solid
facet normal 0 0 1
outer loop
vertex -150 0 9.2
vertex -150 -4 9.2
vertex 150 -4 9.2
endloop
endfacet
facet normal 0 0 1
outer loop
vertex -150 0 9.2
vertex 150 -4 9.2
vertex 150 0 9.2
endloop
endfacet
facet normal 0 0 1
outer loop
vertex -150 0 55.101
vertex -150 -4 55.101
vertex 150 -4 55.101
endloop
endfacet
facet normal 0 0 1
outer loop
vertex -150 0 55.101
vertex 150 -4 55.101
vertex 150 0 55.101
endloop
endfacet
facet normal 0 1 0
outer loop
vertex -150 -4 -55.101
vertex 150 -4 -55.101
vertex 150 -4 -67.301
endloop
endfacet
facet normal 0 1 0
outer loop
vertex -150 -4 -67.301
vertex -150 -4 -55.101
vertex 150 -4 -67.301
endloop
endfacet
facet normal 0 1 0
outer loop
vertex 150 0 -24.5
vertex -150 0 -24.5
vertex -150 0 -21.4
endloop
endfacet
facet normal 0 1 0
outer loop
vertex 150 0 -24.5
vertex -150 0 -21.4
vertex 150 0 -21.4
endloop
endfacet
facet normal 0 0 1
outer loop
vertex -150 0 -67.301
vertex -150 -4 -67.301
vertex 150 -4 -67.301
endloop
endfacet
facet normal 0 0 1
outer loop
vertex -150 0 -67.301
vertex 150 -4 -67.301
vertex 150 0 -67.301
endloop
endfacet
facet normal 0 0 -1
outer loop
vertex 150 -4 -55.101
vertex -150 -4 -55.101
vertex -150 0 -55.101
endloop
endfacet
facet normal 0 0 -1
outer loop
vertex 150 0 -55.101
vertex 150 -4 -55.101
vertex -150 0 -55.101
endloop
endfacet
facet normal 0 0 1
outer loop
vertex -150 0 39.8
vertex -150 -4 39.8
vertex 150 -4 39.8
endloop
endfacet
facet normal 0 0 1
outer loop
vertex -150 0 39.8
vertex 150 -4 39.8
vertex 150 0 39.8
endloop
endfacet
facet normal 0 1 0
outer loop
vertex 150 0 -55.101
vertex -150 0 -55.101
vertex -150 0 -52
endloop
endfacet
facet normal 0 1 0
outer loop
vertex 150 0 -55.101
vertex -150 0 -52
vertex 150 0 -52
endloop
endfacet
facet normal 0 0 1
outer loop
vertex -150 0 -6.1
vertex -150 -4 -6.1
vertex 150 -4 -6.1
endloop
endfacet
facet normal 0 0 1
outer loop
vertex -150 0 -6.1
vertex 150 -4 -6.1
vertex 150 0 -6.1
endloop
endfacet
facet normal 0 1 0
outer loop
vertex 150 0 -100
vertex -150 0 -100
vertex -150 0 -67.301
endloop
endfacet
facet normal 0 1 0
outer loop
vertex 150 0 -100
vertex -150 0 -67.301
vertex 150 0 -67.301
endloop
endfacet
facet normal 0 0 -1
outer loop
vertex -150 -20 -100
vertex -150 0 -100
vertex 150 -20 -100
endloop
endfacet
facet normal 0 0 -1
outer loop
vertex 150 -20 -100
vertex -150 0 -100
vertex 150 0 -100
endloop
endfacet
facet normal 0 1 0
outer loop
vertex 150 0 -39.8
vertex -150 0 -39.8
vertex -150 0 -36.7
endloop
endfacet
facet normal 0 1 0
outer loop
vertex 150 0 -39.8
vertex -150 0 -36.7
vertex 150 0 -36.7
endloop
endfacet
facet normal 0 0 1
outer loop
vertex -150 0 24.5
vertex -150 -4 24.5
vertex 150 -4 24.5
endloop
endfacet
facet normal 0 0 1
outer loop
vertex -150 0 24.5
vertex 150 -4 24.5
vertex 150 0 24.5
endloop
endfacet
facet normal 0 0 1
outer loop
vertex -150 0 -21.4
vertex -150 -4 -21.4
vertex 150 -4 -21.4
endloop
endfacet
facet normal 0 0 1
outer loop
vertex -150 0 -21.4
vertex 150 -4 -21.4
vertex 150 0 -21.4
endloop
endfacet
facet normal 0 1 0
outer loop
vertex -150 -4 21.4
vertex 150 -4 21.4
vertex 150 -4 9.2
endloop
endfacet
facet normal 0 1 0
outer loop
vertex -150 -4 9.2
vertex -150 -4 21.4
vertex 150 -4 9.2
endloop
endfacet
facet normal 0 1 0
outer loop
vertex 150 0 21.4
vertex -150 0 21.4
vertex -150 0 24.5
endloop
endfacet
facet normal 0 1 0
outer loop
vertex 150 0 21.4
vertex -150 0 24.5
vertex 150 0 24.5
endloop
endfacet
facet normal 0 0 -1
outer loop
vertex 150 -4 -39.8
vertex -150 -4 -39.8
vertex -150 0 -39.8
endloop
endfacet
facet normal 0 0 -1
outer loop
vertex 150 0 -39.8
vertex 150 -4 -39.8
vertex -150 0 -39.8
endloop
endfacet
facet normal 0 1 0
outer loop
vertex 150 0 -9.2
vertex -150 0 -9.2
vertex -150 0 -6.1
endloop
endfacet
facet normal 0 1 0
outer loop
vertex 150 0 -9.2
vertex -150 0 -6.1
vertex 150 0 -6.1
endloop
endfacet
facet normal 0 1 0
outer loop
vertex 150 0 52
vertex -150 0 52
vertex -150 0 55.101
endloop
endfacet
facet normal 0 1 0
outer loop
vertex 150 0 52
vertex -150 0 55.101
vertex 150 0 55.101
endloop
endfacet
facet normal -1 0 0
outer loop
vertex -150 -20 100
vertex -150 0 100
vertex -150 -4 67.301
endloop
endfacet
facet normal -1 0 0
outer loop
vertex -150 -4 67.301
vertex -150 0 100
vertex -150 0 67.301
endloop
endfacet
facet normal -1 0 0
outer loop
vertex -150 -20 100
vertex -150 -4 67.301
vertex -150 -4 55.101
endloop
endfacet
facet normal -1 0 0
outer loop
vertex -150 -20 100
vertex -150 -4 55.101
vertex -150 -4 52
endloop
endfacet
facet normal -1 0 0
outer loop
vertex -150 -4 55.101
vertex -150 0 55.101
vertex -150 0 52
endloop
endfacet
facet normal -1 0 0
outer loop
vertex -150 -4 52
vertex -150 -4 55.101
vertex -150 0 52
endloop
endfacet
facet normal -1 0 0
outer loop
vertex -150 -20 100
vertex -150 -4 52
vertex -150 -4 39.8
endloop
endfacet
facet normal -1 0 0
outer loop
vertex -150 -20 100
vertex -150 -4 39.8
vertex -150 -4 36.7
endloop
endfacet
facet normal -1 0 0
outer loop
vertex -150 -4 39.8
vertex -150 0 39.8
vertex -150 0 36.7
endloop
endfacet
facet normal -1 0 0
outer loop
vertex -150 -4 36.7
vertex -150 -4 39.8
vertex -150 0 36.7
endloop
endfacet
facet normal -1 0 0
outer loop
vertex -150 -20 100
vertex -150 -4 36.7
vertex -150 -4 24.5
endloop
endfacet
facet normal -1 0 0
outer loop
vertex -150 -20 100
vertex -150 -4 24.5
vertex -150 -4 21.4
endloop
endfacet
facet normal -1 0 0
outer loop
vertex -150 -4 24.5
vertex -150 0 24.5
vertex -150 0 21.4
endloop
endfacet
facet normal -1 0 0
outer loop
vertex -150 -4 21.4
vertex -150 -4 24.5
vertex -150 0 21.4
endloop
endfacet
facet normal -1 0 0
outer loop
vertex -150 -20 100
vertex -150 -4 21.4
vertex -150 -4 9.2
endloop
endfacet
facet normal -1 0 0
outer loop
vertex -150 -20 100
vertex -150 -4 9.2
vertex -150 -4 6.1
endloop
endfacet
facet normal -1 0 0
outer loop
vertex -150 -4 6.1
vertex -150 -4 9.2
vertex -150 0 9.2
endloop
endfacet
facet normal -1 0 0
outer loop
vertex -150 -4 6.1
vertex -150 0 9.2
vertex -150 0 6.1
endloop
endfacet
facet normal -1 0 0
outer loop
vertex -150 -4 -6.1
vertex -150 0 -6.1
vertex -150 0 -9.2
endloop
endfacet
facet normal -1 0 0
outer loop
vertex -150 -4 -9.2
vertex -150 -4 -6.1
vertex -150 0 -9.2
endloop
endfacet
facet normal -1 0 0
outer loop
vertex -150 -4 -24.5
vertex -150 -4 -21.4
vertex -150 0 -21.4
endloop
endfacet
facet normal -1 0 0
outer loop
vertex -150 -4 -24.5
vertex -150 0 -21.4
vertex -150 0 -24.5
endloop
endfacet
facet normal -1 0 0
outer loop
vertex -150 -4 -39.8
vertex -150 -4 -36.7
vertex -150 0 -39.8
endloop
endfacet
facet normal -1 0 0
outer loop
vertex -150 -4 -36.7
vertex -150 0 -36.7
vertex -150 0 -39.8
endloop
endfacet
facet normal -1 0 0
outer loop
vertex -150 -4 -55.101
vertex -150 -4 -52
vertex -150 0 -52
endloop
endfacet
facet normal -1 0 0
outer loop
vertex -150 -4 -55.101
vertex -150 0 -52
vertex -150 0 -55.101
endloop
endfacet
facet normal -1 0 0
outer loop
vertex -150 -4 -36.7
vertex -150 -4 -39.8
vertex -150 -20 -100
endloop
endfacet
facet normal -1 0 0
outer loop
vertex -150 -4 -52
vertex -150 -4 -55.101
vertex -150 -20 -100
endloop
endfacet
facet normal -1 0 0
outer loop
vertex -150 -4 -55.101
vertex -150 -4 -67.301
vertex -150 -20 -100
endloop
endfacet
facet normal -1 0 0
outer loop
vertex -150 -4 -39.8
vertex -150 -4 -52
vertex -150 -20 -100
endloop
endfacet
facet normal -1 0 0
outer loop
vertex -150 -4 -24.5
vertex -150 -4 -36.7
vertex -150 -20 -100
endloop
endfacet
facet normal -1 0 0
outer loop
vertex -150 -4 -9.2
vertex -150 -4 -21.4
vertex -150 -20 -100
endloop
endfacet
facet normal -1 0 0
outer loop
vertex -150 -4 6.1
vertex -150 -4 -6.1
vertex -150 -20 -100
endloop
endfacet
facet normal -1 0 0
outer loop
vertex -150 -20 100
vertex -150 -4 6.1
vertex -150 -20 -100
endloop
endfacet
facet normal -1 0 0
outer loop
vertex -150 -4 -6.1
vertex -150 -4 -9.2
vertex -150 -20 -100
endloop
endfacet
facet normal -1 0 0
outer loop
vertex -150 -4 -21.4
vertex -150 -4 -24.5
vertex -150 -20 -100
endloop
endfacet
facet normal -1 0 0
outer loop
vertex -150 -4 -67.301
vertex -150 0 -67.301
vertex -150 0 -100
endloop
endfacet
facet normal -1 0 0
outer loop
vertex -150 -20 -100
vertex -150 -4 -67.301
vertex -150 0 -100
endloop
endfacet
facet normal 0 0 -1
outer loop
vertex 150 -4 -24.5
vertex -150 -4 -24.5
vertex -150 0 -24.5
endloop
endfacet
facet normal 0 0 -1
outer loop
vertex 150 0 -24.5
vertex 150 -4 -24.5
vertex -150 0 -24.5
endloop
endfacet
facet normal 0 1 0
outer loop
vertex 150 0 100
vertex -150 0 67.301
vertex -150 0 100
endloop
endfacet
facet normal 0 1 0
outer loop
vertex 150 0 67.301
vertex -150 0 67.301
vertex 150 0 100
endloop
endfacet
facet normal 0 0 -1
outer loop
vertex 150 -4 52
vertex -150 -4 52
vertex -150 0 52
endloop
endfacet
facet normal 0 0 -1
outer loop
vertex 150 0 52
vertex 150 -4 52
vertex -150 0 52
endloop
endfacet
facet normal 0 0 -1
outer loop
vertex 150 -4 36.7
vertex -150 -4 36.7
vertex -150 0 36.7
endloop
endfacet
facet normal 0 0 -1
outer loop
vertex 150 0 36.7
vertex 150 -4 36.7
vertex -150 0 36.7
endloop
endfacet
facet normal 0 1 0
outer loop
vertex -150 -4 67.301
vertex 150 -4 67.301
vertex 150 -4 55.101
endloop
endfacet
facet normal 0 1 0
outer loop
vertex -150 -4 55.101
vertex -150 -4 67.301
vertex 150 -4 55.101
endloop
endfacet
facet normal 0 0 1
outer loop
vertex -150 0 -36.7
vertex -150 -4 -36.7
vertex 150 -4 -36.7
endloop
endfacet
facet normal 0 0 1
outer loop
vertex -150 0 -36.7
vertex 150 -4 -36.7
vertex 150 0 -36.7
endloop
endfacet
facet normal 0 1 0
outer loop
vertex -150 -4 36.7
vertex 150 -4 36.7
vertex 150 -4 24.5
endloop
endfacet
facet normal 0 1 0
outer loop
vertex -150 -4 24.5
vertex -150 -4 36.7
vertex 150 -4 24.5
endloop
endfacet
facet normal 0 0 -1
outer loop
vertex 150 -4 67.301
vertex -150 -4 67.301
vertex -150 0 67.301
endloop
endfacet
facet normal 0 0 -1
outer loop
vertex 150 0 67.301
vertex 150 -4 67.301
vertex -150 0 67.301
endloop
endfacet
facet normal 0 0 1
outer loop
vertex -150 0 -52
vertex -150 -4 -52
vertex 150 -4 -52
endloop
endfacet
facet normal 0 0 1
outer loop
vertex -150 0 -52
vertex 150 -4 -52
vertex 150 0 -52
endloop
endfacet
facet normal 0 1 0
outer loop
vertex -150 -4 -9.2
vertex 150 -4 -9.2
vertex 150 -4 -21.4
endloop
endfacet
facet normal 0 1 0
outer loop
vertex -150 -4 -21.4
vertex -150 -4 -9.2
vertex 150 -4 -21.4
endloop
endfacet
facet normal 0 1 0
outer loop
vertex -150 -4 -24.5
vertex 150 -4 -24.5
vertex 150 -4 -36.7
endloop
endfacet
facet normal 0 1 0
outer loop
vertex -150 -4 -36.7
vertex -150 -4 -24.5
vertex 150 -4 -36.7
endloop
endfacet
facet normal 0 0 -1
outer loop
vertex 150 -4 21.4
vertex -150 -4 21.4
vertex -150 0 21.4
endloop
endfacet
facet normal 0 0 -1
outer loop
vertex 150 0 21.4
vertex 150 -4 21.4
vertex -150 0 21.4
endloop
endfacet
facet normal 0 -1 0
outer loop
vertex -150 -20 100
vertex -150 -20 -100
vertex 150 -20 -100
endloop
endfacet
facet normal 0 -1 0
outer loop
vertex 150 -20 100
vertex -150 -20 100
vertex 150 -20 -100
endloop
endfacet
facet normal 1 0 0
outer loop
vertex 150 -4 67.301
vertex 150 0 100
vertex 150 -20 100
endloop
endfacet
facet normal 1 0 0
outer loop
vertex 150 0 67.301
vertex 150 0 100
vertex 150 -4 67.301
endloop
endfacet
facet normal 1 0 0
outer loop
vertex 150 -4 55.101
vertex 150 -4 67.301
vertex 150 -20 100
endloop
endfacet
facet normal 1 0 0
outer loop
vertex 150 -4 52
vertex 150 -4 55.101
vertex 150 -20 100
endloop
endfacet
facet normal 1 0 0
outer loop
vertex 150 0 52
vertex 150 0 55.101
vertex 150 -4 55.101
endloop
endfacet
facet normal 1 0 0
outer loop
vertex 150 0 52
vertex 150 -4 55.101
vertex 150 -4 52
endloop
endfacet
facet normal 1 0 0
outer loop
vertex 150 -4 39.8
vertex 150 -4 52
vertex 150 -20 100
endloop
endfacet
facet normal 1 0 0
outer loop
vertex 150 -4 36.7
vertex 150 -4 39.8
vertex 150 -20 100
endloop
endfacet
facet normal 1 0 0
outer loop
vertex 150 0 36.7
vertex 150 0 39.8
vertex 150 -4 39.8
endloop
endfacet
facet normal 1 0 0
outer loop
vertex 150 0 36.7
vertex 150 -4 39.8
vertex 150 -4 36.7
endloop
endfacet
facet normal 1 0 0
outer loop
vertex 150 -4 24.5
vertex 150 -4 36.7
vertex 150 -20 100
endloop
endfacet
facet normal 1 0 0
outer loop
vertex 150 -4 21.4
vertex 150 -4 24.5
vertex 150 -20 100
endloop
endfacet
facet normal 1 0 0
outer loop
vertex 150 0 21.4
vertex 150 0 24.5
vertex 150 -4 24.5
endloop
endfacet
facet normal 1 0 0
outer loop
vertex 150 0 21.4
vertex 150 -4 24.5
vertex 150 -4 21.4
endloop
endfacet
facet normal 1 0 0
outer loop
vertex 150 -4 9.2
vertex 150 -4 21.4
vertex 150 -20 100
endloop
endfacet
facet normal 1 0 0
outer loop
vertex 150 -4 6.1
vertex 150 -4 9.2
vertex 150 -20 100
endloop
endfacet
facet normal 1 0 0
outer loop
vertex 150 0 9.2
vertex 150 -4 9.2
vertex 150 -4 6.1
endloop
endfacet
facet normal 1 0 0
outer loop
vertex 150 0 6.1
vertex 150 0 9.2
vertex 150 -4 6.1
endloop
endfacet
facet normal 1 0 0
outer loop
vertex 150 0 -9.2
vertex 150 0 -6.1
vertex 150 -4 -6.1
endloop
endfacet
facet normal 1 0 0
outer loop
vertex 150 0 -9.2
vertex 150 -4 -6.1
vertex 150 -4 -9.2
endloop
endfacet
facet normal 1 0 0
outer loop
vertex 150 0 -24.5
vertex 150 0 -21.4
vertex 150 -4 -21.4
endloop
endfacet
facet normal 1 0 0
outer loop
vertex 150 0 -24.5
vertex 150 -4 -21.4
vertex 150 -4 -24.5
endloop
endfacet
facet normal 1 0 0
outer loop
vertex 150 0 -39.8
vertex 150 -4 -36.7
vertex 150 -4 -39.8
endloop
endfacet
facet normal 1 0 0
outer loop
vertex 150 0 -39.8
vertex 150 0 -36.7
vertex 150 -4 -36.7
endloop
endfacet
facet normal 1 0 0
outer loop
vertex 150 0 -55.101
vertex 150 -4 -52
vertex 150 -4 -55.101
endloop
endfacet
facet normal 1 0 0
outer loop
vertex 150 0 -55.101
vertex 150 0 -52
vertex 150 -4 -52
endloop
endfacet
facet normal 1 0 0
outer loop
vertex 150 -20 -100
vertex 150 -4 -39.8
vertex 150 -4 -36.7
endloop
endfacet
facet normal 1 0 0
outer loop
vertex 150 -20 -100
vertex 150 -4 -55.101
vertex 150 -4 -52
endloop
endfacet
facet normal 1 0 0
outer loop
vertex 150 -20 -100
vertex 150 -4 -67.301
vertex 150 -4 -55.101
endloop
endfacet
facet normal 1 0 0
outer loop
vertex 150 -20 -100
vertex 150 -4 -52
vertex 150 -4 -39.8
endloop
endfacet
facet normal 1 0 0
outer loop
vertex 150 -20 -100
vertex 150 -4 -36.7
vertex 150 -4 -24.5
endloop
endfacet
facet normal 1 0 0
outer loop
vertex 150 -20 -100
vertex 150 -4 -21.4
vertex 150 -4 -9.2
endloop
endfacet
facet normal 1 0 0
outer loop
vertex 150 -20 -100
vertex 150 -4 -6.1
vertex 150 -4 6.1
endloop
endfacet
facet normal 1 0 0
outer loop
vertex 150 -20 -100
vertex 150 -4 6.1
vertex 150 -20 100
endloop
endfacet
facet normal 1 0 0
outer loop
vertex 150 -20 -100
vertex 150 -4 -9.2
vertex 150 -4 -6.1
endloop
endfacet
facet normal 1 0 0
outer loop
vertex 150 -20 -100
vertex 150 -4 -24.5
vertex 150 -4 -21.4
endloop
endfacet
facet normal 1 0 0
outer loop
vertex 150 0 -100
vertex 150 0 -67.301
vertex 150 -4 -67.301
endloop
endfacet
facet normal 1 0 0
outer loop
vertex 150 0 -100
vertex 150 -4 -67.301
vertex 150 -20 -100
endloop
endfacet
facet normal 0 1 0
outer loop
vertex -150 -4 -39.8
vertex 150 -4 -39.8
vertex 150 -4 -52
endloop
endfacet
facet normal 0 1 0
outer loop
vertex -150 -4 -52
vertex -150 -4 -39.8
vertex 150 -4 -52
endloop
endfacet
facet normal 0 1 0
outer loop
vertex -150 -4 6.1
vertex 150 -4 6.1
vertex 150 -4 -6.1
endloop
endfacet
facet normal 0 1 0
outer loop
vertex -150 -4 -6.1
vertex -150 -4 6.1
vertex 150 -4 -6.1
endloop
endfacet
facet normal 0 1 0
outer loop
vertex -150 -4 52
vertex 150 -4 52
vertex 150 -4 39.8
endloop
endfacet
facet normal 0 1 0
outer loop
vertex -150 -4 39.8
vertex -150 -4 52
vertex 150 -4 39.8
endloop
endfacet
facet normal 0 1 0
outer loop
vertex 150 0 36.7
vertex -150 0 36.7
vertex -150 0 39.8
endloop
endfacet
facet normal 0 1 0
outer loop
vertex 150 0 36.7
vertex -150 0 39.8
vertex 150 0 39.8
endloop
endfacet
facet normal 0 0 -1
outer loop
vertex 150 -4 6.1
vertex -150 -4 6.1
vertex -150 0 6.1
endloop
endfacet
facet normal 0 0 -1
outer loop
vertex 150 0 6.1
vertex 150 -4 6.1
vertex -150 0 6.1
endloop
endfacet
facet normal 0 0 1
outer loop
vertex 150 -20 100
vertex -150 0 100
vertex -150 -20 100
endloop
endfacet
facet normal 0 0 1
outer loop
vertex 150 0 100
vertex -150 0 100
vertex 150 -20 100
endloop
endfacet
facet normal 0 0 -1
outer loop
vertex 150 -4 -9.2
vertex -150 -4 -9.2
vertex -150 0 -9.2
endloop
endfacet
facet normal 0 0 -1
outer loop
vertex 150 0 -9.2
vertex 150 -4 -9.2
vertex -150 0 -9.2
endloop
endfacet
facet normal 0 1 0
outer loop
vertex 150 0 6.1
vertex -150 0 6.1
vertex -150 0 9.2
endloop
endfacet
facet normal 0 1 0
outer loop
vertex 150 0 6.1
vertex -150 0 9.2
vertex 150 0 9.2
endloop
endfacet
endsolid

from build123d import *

# Parameters (mm, degrees)
SKETCH1_W           = 300
SKETCH1_H           = 200
BOSS_EXTRUDE1_DEPTH = 20
SKETCH2_W           = 12.2
SKETCH2_H           = 4
CUT_EXTRUDE1_DEPTH  = 317.859590355
LPATTERN1_COUNT     = 9
LPATTERN1_PITCH     = 15.300152


with BuildPart() as part:
    # Sketch1 → Boss-Extrude1 (new body)
    with BuildSketch(Plane(origin=(0, 0, 0), x_dir=(1, 0, 0), z_dir=(0, 1, 0))):
        Rectangle(SKETCH1_W, SKETCH1_H)
    extrude(amount=-BOSS_EXTRUDE1_DEPTH)

    # Sketch2 → Cut-Extrude1 (cut, through all)
    with BuildSketch(Plane(origin=(150, 0, 0), x_dir=(0, 0, -1), z_dir=(1, 0, 0))):
        with Locations((-61.200608, -2)):
            Rectangle(SKETCH2_W, SKETCH2_H)
    cut_extrude1 = extrude(amount=-CUT_EXTRUDE1_DEPTH, mode=Mode.SUBTRACT)

    # LPattern1: Cut-Extrude1 ×9
    with Locations(*[(0, 0, -i * LPATTERN1_PITCH) for i in range(1, LPATTERN1_COUNT)]):
        add(cut_extrude1, mode=Mode.SUBTRACT)


solid = part.part
